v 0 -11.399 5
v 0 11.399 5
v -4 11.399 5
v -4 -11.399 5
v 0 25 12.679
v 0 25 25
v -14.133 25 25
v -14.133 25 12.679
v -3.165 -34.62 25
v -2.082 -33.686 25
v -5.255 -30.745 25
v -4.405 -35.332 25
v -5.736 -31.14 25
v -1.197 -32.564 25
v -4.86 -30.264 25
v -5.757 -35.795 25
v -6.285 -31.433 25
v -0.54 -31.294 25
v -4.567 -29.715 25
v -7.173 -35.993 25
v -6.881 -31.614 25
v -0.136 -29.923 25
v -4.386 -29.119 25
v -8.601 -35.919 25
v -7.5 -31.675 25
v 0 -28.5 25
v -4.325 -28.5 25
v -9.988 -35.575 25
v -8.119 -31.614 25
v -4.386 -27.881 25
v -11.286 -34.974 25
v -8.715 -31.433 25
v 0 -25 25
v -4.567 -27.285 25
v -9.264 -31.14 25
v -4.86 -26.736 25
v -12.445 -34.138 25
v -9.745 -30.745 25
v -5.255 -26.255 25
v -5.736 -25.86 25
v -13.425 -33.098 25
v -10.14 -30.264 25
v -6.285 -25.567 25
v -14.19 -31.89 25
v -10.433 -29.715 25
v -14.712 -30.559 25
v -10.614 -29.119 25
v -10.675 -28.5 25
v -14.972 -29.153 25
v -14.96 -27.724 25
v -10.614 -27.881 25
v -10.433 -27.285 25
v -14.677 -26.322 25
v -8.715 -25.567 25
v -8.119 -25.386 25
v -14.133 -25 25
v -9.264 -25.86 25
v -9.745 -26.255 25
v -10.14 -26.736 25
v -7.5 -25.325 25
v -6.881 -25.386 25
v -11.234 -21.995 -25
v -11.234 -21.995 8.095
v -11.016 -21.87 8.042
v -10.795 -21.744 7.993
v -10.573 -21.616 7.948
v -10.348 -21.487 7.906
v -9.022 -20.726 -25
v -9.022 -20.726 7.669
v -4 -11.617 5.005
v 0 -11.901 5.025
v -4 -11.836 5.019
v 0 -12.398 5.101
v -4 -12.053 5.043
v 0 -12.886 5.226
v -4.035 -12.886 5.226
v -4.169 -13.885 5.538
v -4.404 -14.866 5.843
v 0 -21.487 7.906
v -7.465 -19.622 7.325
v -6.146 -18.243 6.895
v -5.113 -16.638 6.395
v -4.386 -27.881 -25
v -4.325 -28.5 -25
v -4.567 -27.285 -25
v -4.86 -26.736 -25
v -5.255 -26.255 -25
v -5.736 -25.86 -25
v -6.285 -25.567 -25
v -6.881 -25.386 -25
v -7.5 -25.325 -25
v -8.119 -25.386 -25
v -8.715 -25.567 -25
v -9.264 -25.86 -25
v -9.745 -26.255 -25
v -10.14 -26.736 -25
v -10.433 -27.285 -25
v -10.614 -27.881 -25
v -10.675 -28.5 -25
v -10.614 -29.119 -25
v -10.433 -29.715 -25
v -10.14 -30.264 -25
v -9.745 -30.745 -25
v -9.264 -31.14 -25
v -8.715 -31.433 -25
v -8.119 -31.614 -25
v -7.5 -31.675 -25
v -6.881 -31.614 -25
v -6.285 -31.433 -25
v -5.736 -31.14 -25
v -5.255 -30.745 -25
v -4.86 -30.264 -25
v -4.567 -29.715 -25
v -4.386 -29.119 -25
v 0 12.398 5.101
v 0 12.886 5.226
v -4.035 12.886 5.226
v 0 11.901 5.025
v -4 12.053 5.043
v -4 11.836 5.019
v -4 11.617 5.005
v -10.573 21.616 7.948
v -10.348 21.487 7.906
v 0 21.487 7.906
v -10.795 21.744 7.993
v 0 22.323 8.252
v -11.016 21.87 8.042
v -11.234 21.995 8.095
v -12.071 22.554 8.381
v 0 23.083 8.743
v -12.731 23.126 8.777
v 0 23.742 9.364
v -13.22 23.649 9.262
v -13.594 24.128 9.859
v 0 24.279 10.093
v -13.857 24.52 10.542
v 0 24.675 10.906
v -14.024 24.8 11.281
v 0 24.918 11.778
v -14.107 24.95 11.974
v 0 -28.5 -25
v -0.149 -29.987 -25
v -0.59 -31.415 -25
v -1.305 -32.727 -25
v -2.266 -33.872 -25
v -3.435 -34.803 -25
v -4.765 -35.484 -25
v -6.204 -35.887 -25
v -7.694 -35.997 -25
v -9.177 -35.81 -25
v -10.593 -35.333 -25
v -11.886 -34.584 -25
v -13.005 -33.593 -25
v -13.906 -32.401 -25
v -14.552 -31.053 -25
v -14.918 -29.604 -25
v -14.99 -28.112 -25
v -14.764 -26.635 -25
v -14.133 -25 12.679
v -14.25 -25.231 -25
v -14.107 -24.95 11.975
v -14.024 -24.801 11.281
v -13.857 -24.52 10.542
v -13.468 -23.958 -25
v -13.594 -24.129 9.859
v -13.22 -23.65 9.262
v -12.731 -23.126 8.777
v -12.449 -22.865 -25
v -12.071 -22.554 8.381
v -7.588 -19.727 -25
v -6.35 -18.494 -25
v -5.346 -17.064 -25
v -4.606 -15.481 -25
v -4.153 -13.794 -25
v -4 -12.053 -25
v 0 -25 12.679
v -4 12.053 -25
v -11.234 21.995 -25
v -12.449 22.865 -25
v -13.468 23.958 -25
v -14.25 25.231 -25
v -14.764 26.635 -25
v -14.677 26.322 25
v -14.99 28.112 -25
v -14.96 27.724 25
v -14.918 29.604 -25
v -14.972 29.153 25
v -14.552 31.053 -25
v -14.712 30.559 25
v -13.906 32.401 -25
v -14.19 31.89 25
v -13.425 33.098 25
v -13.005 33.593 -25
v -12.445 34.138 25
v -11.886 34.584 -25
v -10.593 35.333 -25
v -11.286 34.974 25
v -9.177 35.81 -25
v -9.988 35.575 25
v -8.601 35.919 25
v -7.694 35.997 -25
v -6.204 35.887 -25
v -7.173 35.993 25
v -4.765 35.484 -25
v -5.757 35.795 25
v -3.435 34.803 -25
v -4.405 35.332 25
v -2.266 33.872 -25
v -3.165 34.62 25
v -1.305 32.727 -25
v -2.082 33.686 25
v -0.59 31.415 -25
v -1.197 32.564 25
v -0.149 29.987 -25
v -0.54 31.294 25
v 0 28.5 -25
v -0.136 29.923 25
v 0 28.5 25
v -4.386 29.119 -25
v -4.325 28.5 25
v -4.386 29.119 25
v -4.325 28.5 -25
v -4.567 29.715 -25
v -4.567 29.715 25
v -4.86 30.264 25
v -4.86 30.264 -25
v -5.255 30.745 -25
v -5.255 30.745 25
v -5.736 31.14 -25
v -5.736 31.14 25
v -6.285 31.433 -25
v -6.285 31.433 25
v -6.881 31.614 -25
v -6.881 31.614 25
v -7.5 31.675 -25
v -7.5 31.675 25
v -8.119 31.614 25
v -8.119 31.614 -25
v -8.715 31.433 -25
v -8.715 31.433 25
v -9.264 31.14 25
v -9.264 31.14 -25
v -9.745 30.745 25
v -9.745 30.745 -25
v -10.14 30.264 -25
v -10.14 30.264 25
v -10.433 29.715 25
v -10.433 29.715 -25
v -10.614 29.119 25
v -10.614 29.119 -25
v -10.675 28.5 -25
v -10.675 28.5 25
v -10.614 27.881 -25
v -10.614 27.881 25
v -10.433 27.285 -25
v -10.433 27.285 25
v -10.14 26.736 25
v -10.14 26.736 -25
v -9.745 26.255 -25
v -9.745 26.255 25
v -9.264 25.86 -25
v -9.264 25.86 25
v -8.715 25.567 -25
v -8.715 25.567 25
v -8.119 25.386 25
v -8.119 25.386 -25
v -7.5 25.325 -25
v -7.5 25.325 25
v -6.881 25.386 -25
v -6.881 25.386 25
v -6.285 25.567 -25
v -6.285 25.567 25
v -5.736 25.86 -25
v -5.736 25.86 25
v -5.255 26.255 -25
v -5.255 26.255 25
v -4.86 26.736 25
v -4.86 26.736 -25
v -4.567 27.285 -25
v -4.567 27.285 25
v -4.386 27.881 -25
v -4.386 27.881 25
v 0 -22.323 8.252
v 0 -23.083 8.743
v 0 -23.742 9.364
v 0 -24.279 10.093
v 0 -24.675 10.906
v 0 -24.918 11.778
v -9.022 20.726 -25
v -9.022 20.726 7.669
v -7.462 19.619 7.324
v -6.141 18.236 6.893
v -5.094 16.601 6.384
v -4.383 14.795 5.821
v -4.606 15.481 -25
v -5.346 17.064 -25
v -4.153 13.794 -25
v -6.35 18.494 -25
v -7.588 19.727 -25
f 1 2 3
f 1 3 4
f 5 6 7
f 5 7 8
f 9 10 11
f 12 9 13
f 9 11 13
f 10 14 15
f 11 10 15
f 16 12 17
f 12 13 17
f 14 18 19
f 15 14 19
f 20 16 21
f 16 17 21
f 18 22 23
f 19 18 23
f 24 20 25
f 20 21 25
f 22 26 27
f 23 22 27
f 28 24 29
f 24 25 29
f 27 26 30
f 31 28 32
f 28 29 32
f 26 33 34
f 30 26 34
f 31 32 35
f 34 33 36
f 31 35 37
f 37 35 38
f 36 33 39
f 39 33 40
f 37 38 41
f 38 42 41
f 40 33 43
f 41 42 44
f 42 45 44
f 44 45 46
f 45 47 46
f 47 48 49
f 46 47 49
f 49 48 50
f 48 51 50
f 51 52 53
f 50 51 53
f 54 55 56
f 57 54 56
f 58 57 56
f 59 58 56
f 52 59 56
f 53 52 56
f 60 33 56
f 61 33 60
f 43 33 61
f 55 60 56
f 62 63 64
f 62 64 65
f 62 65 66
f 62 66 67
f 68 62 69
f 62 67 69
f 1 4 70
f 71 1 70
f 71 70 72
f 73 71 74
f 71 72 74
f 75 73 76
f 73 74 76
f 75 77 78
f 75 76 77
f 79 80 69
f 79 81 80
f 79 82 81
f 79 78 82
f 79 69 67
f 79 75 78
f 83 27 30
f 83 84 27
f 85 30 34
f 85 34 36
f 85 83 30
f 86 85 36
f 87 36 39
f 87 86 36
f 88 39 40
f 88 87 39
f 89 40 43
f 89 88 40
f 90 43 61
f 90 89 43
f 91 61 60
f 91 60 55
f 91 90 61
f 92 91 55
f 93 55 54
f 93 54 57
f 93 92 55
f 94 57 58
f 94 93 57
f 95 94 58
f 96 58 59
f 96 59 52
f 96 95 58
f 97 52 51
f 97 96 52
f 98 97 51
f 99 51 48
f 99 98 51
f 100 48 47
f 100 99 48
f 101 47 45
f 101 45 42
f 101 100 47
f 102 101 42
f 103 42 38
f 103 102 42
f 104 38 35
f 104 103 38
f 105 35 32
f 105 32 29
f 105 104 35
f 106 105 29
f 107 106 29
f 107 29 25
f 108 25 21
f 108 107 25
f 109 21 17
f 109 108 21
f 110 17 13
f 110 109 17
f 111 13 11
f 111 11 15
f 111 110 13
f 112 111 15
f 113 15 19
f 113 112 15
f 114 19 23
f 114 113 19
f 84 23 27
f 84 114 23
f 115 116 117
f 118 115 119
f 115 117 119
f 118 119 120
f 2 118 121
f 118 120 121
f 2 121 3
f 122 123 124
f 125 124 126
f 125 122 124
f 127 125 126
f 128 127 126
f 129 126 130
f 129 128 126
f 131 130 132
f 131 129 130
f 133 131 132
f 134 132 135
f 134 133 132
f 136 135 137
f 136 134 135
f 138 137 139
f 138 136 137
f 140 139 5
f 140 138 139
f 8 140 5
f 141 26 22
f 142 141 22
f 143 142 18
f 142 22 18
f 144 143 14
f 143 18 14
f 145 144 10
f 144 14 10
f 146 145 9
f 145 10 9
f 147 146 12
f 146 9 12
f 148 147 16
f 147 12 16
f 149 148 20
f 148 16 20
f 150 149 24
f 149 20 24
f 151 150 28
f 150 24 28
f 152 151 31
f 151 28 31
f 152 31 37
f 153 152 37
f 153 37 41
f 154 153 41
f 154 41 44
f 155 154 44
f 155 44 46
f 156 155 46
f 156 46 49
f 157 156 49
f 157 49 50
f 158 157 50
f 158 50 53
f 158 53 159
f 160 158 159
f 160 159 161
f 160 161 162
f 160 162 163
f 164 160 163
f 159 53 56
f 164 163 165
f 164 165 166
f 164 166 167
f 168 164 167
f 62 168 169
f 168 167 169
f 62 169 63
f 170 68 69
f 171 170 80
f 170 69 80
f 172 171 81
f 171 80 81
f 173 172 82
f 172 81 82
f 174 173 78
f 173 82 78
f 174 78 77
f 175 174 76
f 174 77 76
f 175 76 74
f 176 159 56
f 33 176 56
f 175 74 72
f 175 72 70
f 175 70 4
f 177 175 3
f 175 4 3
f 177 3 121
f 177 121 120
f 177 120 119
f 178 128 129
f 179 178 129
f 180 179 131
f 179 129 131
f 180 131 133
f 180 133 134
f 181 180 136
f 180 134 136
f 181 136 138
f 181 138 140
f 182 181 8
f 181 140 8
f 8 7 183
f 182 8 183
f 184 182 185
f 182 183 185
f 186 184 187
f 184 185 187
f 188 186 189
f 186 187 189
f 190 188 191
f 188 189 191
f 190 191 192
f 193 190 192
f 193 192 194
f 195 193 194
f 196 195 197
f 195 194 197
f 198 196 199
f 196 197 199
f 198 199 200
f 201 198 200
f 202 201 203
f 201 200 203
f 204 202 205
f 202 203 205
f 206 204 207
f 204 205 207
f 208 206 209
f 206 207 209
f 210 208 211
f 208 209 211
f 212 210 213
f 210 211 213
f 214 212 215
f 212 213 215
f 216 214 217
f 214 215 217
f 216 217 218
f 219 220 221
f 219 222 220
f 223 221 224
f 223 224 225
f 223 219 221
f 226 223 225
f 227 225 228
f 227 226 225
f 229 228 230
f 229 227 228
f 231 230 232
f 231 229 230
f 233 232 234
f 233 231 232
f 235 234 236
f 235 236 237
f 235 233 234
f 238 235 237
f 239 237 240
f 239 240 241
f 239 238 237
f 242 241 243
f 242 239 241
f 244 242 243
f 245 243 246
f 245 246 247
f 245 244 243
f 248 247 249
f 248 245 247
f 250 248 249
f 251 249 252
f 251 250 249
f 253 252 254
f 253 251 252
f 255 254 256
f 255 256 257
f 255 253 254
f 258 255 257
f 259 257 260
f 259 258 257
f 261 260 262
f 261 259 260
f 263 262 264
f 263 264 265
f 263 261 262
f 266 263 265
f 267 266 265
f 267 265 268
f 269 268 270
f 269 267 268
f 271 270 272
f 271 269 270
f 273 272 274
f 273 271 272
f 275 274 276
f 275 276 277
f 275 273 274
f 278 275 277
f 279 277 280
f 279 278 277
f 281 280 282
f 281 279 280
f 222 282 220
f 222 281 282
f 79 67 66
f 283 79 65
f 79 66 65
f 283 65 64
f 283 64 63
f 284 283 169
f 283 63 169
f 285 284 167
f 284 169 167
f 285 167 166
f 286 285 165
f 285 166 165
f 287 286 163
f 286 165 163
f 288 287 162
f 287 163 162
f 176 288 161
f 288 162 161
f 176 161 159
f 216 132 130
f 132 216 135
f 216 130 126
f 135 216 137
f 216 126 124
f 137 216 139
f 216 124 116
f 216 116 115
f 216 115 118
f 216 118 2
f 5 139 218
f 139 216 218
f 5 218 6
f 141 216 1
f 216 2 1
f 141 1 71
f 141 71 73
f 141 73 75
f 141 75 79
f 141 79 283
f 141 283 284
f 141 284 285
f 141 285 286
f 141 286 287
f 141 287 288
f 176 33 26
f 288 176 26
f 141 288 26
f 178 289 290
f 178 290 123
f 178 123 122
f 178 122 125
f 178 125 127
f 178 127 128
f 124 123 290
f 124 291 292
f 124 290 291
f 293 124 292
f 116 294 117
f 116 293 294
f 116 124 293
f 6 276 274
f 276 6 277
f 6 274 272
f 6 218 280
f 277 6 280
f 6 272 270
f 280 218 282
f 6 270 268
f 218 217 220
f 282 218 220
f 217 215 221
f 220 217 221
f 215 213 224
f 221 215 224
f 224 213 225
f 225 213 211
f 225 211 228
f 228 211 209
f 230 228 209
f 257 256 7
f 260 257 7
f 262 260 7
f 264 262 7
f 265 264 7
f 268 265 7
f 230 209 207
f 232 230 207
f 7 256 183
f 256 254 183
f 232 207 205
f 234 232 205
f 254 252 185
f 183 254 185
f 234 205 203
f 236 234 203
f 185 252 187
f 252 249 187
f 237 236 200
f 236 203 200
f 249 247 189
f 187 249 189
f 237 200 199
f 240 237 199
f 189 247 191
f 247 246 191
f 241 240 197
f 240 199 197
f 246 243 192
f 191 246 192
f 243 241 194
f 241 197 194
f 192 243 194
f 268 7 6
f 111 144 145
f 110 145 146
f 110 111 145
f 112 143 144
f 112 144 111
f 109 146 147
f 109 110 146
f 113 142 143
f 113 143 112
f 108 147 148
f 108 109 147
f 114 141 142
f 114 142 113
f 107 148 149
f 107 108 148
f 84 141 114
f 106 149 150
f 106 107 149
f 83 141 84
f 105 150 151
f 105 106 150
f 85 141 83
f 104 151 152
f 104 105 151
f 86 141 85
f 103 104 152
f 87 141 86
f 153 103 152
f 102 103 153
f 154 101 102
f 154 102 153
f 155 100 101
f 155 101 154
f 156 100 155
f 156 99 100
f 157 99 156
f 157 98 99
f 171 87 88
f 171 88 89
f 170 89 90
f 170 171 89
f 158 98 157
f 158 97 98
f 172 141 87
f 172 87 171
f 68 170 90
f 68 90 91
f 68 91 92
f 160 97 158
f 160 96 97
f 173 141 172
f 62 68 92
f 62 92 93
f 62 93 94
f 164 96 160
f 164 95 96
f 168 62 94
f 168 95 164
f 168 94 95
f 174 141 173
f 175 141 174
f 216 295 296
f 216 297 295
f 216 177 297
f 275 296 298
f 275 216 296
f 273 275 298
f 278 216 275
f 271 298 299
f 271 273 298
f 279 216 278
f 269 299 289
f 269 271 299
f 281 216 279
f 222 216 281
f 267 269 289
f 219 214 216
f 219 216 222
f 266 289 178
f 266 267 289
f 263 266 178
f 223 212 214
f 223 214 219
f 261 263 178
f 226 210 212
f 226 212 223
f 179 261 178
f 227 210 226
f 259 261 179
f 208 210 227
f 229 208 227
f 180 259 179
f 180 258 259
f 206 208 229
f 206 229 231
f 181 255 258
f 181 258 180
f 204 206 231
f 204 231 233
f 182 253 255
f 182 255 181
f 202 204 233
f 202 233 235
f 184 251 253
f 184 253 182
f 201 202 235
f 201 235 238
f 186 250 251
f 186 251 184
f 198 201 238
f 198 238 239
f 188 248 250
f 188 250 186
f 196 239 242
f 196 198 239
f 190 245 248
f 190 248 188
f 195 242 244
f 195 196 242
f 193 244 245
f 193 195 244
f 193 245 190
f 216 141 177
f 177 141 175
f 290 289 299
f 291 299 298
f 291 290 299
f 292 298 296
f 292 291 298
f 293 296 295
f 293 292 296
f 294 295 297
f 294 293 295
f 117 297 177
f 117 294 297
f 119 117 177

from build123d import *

# Parameters (mm, degrees)
CROQUIS1_R              = 3.175
SALIENTE_EXTRUIR1_DEPTH = 25
REDONDEO1_R             = 10
CORTAR_EXTRUIR1_DEPTH   = 16
REDONDEO2_R             = 5


with BuildPart() as part:
    # Croquis1 → Saliente-Extruir1 (new body, symmetric)
    with BuildSketch(Plane.XY):
        with BuildLine():
            Line((-4, 17.843284464), (-11.233642387, 21.995392823))
            ThreePointArc((-11.233642387, 21.995392823), (-11.258169907, 34.990466775), (0, 28.5))
            Line((0, 28.5), (0, -28.5))
            ThreePointArc((0, -28.5), (-11.258169907, -34.990466775), (-11.233642387, -21.995392823))
            Line((-11.233642387, -21.995392823), (-4, -17.843284464))
            Line((-4, -17.843284464), (-4, 17.843284464))
        make_face()
        with Locations((-7.5, 28.5)):
            Circle(CROQUIS1_R, mode=Mode.SUBTRACT)
        with Locations((-7.5, -28.5)):
            Circle(CROQUIS1_R, mode=Mode.SUBTRACT)
    extrude(amount=SALIENTE_EXTRUIR1_DEPTH, both=True)

    # Redondeo1
    redondeo1_edges = [part.edges().sort_by_distance(p)[0] for p in [
        (-4, -17.843284464, 0),
        (-4, 17.843284464, 0),
    ]]
    fillet(redondeo1_edges, radius=REDONDEO1_R)

    # Croquis2 → Cortar-Extruir1 (cut, through all)
    with BuildSketch(Plane(origin=(0, 0, 0), x_dir=(0, 0, -1), z_dir=(1, 0, 0))):
        Polygon((-9, 25), (-5, 12.159257653), (-5, -12.159257653), (-9, -25), (-29.873538988, -25), (-29.873538988, 25), align=None)
    extrude(amount=-CORTAR_EXTRUIR1_DEPTH, mode=Mode.SUBTRACT)

    # Redondeo2
    redondeo2_edges = [part.edges().sort_by_distance(p)[0] for p in [
        (-2.000282316, 12.159257653, 5),
        (-2.000282316, -12.159257653, 5),
        (-7.06662479, -25, 9),
        (-7.06662479, 25, 9),
    ]]
    fillet(redondeo2_edges, radius=REDONDEO2_R)


solid = part.part
